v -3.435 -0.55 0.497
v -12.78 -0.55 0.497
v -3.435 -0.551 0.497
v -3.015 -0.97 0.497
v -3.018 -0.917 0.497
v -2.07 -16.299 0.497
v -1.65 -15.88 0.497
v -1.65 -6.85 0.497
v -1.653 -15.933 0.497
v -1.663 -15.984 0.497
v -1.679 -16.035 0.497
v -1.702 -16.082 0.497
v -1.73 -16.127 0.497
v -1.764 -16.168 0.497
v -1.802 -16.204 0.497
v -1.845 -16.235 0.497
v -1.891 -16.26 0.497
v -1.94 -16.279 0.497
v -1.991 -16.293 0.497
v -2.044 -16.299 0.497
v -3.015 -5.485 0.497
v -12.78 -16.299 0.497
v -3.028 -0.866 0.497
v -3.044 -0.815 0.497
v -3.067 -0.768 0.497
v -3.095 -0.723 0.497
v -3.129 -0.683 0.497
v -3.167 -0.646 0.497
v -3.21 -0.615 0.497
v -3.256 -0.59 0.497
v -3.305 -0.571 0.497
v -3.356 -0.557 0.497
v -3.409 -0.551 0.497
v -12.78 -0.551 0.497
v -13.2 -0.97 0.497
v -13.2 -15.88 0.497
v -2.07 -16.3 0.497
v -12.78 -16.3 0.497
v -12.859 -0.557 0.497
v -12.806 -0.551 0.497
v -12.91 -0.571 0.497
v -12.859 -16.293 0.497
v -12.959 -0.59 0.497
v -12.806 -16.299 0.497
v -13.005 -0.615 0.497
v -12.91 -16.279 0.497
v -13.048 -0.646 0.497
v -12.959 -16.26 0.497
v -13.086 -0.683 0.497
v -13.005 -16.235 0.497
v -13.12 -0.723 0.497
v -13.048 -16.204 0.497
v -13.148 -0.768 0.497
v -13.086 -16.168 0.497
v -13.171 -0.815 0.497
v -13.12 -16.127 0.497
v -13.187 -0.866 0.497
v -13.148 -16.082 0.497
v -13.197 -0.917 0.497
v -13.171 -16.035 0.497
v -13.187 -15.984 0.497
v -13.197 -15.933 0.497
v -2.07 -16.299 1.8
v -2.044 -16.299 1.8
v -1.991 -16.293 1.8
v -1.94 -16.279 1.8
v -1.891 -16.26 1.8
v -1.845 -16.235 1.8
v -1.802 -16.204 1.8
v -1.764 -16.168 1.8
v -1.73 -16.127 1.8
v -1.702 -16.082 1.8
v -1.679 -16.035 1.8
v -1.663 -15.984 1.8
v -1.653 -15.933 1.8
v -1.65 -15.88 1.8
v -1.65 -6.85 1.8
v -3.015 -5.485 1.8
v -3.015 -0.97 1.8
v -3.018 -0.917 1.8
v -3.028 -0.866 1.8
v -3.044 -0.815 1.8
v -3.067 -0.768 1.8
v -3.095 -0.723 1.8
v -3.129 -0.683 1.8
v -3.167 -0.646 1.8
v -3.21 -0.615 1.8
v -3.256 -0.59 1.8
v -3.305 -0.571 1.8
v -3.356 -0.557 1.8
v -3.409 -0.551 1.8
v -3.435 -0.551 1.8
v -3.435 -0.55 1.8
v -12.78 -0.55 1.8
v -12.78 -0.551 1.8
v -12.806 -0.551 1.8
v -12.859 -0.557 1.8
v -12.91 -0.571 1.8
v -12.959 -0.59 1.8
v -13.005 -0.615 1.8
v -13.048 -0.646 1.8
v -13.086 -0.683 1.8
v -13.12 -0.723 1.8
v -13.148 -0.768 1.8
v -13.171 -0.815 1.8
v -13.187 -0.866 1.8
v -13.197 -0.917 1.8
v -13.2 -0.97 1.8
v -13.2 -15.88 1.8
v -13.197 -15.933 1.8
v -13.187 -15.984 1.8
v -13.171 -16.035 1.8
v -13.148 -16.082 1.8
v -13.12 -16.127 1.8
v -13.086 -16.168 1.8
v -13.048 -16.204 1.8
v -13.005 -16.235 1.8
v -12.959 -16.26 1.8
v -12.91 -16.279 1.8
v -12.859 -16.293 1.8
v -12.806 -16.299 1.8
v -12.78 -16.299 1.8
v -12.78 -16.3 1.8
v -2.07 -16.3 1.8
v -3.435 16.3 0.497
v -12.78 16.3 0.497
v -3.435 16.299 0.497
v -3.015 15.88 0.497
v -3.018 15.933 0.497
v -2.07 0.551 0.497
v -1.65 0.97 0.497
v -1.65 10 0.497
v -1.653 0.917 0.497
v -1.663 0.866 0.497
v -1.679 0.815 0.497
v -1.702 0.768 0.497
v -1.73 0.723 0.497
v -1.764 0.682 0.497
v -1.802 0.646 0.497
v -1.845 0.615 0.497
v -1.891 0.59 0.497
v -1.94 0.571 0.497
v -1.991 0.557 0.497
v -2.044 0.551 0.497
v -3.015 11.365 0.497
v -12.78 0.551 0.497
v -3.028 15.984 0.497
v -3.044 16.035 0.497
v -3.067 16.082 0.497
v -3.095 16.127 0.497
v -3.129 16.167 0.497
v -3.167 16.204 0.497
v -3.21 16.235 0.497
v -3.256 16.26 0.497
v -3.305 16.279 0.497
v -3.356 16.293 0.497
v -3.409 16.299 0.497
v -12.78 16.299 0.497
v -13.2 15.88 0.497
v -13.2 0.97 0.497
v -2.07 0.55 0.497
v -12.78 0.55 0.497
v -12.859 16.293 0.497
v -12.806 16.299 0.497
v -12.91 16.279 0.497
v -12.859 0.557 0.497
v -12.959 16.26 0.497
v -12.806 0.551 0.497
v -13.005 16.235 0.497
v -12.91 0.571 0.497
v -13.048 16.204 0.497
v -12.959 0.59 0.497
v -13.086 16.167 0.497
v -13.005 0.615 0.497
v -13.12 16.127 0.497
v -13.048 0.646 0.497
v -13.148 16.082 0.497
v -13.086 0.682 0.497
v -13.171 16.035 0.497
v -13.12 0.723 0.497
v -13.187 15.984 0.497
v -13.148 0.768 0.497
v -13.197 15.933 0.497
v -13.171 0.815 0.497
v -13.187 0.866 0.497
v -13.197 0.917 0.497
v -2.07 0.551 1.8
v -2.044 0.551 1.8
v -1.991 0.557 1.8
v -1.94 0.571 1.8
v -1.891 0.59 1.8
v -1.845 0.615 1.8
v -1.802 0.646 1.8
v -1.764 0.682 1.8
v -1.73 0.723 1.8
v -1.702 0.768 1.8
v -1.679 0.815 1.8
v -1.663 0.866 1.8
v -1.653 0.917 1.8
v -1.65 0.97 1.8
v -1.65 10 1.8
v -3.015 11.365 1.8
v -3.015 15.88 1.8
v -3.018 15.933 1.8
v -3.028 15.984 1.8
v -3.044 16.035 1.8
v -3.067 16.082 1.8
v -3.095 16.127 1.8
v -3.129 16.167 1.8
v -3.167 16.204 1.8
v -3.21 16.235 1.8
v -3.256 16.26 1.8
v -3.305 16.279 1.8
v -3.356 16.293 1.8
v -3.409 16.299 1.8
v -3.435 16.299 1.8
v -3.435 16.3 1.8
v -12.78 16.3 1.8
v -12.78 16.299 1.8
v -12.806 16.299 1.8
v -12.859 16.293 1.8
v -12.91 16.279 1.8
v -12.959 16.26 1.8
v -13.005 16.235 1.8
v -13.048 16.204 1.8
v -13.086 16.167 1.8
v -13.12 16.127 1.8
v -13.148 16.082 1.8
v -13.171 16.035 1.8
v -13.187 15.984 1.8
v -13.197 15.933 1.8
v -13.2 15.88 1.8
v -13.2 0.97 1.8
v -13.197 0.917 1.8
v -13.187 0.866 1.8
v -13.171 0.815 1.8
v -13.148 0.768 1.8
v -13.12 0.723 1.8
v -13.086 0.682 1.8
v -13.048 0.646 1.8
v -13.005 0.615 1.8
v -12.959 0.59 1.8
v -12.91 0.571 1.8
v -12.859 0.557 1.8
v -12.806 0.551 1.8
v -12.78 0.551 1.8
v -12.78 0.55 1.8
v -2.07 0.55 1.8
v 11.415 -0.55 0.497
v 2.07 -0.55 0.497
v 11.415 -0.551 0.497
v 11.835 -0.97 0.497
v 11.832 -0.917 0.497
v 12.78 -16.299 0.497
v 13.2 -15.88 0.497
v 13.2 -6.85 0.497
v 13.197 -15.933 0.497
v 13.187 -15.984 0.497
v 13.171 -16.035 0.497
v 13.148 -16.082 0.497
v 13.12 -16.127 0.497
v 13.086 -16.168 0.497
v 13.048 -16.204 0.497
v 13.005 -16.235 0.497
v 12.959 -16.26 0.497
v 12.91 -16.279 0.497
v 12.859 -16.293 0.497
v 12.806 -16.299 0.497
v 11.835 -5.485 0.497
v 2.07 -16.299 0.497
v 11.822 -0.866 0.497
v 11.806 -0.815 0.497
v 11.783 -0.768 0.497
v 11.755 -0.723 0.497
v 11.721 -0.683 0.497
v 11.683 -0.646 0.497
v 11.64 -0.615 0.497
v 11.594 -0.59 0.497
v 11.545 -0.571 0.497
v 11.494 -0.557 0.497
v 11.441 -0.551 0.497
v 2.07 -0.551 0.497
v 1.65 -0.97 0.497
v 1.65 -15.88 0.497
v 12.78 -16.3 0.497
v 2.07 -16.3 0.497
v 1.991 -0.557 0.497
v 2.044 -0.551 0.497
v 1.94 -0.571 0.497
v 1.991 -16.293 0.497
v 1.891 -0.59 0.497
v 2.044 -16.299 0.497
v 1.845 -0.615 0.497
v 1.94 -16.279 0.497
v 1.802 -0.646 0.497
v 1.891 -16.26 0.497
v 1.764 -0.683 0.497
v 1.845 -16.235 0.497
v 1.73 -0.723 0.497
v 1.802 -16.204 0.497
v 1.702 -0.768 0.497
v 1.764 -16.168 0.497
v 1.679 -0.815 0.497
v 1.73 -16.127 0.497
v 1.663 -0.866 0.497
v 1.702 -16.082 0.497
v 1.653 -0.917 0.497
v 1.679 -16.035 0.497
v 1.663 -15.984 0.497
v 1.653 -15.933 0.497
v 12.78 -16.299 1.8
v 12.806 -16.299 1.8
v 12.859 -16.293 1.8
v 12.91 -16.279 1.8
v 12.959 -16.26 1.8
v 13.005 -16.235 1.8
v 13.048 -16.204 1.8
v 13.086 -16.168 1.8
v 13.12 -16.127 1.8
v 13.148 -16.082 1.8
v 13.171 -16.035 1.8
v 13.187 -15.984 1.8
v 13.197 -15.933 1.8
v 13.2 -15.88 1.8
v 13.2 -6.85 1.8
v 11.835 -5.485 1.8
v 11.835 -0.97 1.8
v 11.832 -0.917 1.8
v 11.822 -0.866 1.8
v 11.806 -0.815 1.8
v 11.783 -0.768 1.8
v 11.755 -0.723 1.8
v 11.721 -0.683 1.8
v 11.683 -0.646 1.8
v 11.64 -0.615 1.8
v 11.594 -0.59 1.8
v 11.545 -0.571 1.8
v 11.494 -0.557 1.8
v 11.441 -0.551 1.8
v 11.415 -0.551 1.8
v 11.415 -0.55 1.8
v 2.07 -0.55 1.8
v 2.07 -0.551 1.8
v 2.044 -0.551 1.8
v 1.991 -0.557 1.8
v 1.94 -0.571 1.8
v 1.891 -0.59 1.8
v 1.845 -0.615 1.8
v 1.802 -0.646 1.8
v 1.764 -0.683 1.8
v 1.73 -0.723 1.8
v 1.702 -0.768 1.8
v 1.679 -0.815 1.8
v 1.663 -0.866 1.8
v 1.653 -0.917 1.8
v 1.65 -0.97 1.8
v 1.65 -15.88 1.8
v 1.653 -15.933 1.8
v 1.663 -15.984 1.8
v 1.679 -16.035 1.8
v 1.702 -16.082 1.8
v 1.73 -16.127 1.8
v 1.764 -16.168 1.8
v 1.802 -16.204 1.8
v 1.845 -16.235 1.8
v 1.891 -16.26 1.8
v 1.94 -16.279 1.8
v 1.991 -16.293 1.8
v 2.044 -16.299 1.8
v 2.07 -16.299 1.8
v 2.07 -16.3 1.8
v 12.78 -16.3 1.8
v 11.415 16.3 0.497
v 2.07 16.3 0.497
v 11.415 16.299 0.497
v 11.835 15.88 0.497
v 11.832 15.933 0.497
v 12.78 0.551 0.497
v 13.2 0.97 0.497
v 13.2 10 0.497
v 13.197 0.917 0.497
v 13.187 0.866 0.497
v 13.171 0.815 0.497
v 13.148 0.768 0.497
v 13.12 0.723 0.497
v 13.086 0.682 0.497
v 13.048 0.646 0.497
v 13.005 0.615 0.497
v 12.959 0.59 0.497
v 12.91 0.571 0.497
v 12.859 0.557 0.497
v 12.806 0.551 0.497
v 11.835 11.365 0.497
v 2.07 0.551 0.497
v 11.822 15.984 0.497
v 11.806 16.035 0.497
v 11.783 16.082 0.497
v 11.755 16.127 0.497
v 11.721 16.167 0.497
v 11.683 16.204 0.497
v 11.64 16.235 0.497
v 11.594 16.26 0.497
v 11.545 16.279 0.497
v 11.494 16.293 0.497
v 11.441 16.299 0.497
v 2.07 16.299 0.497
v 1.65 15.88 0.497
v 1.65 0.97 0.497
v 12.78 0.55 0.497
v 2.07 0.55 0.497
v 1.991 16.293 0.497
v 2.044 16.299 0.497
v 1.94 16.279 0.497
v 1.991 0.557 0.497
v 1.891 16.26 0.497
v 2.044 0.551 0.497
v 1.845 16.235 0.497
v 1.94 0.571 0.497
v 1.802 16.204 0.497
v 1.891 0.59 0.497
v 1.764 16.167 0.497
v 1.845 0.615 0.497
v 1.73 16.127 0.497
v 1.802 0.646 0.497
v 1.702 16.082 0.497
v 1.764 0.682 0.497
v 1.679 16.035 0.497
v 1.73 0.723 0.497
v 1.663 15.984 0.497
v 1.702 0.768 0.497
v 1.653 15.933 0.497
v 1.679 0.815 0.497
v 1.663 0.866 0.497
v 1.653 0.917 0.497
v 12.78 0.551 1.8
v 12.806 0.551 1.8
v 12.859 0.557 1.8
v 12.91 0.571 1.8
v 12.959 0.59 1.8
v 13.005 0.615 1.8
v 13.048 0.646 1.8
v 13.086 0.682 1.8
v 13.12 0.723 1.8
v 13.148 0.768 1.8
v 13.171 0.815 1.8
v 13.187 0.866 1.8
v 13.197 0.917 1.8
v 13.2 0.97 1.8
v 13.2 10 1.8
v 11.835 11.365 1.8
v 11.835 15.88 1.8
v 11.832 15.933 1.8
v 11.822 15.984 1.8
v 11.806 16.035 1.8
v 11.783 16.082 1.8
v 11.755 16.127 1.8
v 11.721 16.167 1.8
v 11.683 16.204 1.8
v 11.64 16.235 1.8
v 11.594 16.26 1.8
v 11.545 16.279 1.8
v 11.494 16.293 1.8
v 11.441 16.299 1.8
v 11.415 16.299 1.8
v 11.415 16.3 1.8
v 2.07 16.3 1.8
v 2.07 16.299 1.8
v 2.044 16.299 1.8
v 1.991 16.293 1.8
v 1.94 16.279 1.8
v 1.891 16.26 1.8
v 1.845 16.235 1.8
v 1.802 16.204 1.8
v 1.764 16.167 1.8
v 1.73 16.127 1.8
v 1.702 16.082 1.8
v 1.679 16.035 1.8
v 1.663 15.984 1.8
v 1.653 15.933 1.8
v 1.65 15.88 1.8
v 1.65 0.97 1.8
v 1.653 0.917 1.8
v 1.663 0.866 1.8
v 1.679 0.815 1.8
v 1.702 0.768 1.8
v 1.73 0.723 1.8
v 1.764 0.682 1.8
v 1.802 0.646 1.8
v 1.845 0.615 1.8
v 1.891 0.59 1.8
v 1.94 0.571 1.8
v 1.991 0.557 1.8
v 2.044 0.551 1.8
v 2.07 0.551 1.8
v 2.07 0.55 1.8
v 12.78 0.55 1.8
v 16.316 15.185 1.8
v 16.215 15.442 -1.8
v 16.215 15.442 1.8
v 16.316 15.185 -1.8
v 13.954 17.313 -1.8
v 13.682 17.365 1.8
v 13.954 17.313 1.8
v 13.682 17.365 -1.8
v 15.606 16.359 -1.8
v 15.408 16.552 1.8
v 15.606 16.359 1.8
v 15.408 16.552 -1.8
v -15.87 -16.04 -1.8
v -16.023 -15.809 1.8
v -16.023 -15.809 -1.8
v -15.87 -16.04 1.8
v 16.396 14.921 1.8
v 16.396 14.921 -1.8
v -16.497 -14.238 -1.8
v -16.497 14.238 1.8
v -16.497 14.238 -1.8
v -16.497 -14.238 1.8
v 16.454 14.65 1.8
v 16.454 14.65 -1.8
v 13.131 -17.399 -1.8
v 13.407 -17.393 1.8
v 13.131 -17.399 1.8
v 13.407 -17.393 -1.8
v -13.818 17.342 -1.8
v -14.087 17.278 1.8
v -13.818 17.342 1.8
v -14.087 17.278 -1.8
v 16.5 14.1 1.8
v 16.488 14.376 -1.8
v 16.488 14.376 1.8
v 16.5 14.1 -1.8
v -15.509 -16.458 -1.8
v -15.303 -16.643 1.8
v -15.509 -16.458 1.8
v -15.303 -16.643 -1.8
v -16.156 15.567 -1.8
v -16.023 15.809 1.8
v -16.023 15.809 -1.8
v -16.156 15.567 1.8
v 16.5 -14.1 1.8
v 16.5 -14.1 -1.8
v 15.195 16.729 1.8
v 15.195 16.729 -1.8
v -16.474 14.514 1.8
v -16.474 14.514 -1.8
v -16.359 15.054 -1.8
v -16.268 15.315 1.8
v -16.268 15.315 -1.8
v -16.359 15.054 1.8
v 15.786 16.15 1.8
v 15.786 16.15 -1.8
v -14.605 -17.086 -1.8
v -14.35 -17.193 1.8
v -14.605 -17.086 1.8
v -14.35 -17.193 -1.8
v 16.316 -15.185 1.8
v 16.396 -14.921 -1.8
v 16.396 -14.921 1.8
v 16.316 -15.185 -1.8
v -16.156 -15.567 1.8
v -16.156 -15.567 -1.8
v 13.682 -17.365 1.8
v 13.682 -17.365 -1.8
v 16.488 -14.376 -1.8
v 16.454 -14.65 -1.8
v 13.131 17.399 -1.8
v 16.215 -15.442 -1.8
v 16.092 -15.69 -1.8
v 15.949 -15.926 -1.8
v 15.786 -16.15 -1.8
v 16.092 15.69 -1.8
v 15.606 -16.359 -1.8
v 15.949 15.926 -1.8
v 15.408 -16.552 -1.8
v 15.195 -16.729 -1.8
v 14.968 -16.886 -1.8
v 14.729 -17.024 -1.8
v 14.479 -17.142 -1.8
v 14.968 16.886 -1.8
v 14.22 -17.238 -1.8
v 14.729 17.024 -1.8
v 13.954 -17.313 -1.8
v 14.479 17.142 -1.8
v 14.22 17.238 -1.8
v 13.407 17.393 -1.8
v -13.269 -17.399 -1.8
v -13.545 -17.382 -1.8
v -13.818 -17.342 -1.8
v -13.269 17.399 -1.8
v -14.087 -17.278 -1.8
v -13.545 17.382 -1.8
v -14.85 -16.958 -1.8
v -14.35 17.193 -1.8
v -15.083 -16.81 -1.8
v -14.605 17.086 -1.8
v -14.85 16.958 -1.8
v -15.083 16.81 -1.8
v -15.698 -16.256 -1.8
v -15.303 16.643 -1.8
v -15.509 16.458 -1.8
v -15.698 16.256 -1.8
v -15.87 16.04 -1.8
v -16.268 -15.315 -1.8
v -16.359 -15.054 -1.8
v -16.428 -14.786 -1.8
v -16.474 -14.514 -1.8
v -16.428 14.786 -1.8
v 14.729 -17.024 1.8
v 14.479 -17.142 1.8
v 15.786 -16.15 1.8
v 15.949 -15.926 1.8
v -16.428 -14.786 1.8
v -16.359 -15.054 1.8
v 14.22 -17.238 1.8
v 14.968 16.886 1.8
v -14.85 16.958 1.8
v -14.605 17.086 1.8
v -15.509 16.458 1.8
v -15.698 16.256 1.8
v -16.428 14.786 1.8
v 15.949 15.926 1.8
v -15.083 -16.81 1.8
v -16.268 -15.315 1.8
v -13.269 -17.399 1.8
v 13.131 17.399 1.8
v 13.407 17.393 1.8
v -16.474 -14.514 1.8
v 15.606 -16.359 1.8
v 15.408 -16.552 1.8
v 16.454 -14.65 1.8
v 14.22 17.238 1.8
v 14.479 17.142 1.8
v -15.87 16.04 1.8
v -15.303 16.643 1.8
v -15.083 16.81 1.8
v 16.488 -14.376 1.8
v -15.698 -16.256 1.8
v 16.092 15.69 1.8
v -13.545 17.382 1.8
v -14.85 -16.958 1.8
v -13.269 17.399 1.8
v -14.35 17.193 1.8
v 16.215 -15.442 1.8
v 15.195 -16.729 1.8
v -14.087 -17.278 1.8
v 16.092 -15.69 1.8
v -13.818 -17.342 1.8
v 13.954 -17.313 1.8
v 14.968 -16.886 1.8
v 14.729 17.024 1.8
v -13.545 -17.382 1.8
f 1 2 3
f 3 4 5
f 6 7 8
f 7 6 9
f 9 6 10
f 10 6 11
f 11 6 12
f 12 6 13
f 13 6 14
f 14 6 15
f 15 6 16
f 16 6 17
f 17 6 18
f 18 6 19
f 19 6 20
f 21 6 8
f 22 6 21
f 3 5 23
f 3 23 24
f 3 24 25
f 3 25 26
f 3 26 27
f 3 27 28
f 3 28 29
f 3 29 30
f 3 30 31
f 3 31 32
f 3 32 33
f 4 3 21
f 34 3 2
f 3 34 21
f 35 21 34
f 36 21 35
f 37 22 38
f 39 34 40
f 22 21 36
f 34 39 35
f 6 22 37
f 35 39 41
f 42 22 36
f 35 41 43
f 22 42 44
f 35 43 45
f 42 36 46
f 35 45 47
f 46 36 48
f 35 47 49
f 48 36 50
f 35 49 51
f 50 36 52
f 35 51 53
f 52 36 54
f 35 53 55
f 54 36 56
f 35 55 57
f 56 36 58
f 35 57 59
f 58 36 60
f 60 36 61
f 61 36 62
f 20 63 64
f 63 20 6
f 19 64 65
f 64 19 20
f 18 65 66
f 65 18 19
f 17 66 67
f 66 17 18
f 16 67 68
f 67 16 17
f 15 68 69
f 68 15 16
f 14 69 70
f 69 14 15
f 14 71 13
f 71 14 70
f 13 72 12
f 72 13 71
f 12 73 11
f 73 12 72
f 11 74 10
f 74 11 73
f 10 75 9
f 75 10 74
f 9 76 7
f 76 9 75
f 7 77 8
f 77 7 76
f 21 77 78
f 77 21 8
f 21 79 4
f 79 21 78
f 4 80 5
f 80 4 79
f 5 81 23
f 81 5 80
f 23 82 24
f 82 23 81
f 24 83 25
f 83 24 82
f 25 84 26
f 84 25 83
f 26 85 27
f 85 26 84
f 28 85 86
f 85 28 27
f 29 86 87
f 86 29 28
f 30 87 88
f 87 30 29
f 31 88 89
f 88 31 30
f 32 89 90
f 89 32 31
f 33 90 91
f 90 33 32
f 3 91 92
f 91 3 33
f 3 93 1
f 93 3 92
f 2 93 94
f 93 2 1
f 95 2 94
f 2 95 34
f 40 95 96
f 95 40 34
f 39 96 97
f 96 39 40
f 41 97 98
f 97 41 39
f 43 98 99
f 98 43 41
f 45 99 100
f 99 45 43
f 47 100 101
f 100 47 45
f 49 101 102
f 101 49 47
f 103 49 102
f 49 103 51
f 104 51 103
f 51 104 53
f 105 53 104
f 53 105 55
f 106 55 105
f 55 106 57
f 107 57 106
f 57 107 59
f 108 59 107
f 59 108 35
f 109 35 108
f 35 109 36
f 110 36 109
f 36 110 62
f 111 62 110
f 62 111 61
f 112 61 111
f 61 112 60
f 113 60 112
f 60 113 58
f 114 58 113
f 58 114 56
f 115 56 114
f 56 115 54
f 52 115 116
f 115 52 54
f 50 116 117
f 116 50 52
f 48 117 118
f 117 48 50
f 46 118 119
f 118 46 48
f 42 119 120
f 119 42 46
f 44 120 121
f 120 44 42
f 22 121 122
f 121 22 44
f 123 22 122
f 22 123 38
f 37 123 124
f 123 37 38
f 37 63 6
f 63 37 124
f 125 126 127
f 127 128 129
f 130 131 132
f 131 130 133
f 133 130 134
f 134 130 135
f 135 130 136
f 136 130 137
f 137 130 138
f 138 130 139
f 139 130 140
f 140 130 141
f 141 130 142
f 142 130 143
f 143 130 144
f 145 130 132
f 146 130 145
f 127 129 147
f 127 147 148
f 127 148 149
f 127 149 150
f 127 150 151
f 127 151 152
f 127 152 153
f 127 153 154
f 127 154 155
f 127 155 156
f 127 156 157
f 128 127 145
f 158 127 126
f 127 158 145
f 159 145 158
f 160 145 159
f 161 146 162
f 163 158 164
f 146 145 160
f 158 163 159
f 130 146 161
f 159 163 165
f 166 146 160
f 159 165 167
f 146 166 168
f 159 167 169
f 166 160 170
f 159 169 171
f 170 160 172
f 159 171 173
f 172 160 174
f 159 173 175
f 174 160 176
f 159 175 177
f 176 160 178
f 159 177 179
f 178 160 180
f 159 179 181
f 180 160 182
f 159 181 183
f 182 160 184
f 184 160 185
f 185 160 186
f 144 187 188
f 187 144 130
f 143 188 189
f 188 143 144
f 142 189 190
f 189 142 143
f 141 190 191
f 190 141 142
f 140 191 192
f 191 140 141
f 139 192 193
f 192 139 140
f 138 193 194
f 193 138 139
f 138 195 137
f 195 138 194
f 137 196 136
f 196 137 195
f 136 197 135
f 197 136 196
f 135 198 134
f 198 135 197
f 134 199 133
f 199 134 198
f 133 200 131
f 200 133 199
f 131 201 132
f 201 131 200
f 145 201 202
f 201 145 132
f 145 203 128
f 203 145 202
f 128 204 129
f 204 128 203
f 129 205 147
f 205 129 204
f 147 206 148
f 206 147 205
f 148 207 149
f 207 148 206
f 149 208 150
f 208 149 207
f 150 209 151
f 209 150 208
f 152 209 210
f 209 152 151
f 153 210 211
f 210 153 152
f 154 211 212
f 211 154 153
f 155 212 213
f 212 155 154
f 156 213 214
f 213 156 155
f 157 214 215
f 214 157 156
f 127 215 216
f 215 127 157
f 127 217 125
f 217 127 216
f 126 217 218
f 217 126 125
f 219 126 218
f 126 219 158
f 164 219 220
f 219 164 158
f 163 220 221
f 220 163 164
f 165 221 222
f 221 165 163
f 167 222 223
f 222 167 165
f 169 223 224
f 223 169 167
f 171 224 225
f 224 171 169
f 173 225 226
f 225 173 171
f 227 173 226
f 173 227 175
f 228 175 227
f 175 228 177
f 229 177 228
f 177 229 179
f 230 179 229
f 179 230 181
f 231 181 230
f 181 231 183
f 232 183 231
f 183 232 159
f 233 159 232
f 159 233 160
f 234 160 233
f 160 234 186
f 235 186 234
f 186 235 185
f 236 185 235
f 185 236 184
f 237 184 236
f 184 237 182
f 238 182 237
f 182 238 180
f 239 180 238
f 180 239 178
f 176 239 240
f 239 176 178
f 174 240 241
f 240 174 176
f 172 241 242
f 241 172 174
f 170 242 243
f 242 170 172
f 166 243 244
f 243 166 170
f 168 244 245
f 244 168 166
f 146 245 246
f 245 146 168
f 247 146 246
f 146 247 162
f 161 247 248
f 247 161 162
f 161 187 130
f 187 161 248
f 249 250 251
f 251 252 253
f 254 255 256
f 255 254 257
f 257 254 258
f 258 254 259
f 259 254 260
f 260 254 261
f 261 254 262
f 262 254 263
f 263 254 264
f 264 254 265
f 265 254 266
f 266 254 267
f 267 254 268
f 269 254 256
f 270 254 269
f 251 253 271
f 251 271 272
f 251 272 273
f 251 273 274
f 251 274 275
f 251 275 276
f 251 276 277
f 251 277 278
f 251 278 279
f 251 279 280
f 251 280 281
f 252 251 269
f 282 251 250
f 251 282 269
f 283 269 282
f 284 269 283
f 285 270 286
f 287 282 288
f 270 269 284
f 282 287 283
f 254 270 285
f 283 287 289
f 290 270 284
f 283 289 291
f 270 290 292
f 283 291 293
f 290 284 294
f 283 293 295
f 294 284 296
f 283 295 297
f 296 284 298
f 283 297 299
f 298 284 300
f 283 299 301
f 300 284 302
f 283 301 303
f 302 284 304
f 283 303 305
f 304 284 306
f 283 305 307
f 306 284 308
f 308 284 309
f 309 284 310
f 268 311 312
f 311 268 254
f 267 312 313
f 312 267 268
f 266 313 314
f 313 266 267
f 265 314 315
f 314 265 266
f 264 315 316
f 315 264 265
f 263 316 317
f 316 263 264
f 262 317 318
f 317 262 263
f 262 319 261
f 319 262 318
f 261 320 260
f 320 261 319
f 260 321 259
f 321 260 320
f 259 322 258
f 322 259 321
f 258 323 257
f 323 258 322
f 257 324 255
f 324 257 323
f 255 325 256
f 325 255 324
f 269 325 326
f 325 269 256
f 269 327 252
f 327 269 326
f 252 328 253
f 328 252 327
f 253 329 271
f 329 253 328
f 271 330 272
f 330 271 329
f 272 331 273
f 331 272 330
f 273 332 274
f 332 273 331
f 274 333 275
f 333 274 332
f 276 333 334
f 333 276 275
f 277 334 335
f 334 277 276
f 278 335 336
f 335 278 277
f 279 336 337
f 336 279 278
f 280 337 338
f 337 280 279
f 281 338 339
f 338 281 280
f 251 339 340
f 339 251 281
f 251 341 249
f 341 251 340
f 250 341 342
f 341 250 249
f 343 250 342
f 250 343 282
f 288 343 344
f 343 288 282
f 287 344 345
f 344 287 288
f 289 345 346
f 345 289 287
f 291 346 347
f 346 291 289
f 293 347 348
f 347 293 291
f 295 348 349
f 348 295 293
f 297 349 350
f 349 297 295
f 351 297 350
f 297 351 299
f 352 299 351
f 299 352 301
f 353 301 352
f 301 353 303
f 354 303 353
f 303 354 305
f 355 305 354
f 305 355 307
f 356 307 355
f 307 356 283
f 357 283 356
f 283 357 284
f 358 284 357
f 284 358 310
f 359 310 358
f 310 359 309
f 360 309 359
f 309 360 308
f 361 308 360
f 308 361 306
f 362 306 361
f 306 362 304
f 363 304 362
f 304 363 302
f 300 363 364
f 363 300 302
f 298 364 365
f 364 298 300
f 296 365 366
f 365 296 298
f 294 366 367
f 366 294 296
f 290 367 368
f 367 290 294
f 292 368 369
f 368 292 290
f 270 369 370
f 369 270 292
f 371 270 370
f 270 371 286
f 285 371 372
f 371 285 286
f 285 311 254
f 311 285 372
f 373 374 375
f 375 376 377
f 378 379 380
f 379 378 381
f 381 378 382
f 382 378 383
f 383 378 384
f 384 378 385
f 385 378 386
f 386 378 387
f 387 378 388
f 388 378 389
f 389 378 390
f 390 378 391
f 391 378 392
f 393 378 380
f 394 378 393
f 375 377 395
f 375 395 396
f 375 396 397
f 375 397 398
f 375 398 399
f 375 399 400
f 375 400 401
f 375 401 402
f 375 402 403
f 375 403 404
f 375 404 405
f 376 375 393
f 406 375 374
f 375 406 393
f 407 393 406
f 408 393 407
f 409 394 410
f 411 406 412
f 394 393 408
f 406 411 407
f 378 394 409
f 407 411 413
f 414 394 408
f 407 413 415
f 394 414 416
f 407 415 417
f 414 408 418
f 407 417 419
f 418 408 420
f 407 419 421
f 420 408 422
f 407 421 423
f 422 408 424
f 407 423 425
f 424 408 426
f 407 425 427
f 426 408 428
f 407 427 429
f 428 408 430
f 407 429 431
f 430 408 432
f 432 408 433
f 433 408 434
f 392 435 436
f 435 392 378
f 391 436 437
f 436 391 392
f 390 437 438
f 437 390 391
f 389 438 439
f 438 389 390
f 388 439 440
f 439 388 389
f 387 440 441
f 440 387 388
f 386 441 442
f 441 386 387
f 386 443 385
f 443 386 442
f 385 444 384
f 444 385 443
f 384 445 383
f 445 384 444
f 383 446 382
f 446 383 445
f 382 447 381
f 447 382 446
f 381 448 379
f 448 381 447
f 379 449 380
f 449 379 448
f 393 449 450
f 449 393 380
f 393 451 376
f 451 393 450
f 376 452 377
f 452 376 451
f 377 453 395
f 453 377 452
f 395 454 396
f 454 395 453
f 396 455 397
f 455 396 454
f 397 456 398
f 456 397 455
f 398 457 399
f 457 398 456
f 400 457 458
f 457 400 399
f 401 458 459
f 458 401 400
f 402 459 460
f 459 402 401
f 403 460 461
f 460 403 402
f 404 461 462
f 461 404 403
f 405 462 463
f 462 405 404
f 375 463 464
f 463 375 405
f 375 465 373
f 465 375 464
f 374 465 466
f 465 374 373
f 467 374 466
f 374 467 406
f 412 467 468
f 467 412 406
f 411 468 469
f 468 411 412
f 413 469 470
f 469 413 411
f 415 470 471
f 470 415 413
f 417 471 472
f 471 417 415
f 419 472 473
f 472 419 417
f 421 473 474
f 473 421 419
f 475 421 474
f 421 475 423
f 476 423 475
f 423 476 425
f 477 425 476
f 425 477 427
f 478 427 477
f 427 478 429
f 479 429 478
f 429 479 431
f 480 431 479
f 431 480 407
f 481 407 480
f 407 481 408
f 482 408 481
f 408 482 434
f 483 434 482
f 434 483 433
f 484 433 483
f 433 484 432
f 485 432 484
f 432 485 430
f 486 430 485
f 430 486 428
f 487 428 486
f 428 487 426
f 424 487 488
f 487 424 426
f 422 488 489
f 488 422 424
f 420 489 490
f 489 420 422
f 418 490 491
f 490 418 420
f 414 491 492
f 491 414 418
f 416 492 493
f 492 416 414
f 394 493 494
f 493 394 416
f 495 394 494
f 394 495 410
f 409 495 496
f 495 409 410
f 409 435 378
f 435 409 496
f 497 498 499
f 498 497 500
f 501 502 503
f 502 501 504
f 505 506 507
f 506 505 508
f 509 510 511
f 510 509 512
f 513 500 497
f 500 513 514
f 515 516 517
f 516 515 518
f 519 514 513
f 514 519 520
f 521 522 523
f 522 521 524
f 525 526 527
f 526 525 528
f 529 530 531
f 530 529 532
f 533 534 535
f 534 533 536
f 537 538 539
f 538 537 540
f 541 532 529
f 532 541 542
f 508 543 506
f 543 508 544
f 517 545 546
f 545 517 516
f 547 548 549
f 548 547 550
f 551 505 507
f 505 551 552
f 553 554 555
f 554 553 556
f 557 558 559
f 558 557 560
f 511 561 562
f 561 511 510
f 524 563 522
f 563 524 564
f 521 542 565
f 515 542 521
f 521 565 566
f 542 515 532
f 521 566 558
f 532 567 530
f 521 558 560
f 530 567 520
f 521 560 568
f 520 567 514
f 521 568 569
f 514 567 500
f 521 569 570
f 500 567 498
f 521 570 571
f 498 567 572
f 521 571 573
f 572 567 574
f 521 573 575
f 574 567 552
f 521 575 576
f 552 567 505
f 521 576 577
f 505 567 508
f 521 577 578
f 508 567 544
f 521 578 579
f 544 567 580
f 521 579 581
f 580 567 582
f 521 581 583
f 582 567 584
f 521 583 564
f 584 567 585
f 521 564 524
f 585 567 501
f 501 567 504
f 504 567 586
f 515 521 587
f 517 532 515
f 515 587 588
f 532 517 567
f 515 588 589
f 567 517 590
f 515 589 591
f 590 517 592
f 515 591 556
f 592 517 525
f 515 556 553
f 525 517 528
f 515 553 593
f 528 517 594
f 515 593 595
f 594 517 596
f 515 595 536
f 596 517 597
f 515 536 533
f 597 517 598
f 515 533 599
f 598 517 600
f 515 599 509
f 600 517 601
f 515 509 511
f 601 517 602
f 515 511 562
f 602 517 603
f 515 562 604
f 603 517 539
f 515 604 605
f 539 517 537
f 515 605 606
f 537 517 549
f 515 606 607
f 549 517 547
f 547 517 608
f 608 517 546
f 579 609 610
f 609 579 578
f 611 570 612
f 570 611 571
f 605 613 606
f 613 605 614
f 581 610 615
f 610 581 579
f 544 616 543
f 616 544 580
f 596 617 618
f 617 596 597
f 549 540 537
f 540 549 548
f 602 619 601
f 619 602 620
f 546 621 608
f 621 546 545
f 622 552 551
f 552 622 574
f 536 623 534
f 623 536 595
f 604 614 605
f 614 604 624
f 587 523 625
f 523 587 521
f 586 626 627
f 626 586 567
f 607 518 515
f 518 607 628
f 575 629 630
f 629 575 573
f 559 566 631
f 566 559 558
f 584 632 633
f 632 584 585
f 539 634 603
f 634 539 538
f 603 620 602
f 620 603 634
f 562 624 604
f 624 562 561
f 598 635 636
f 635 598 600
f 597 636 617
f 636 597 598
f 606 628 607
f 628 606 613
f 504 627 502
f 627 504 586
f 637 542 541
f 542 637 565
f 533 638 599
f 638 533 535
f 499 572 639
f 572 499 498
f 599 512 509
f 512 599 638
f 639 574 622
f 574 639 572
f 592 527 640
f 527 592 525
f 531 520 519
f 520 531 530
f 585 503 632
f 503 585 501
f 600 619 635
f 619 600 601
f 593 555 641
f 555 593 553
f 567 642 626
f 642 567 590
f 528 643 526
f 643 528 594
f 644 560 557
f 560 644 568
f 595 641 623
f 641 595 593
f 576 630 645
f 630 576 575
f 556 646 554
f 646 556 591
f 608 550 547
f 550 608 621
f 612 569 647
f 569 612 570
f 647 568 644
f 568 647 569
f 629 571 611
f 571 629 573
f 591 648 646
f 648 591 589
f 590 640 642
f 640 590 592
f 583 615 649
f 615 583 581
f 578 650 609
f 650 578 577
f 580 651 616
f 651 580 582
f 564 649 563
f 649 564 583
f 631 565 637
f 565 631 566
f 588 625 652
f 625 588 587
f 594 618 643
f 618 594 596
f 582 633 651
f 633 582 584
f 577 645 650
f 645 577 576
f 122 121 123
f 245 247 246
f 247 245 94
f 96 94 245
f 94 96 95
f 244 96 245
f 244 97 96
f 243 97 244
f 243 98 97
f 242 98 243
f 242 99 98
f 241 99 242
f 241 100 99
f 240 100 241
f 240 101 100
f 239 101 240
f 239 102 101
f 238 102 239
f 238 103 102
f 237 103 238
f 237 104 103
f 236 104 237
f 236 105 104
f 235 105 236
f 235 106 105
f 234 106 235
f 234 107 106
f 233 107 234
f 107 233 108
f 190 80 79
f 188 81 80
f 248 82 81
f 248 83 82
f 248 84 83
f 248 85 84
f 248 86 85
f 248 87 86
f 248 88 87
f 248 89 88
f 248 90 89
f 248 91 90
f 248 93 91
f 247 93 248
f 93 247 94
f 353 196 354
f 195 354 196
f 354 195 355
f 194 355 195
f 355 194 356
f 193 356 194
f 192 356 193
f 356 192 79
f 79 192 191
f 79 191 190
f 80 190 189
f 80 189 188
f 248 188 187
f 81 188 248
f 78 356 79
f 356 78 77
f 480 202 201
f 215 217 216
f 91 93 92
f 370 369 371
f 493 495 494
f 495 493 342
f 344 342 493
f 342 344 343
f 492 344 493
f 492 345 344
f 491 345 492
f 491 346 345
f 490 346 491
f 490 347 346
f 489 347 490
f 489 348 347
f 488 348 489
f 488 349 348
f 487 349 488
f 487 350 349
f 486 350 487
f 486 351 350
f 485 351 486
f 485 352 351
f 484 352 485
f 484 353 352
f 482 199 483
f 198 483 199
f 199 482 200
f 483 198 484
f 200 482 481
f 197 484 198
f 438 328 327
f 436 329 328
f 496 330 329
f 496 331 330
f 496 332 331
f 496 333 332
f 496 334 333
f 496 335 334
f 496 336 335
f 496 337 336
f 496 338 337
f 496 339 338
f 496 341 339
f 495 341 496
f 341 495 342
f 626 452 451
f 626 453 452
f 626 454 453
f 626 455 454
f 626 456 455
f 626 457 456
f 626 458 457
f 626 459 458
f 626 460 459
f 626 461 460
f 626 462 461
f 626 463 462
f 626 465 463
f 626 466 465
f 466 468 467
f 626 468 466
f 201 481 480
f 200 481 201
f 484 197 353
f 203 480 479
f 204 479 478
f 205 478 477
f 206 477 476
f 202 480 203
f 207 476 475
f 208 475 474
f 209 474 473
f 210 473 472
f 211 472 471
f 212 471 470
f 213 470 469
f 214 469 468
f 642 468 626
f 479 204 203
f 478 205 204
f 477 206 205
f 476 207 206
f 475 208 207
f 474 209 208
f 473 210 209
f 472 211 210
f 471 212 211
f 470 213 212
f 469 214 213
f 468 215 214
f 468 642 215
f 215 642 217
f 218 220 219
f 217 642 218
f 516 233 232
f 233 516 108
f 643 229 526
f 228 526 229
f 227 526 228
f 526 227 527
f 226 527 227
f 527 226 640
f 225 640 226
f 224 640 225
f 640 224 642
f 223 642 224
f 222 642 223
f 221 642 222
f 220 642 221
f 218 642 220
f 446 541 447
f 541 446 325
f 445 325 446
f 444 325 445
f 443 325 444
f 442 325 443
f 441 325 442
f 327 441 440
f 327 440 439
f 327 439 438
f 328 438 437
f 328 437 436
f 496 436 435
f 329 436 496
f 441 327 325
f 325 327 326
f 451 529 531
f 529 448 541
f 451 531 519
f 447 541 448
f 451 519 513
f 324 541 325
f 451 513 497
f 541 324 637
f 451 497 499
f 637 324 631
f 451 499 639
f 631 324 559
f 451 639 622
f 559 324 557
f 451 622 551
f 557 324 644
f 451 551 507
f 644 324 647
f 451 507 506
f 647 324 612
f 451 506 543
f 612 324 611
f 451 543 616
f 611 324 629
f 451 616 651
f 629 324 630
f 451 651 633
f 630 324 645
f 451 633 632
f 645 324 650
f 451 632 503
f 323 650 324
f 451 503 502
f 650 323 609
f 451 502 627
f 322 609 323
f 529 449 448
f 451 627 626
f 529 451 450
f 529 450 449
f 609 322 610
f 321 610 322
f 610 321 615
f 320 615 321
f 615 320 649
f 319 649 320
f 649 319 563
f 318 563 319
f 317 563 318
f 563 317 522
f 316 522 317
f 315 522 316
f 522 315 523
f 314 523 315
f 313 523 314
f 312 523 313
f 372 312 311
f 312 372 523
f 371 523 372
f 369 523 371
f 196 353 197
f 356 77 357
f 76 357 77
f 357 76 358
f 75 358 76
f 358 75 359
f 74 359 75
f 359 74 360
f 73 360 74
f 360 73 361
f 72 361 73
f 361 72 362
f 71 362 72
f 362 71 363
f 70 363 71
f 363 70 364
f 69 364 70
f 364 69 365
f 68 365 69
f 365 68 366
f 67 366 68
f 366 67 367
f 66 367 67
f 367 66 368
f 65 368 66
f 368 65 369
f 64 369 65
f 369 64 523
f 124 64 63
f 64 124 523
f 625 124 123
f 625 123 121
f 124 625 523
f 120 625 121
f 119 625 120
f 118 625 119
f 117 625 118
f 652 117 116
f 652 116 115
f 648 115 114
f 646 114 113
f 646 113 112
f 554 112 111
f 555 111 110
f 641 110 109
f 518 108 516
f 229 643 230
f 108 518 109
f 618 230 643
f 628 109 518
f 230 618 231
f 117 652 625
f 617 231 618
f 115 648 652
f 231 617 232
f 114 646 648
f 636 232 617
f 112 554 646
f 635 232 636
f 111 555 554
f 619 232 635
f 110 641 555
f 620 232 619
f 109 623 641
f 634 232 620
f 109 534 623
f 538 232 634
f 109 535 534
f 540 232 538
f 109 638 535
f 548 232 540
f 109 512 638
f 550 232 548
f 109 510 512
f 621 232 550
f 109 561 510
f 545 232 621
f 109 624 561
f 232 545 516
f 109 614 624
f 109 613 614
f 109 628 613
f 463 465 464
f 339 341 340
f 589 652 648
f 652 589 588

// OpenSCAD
// file: ../Modules/Memory/sd.scad
/*
 * Módulos y funciones para trabajar con memorias SD.
 *
 * @author  Joaquín Fernández
 * @url     https://gitlab.com/joaquinfq/openscad/blob/master/Modules/Memory/sd.scad
 * @license CC-BY-NC-4.0
 */
/**
 * Devuelve las medidas de la memoria SD.
 *
 * @param {Number} tolerance Tolerancia a usar para las medidas.
 *
 * @return {Number[]}
 */
function getSdSize(tolerance = 0) = [
    24  + tolerance, 
    32  + tolerance, 
    2.1 + tolerance
];
/**
 * Dibuja una tarjeta SD.
 * Es útil para dejar el espacio en una figura usando la operación `difference`.
 * En este caso se recomienda:
 *
 * - Disminuir el radio para que entre mejor la memoria y usar la 
 *   transformación `scale(1.xx)` para dejar holgura.
 * - Aumentar el valor de `thickness` si se quiere dejar una profundidad mayor.
 *
 * @param radius Radio para redondear los bordes.
 */
module sd(radius = 0.5)
{
    _size = getSdSize();
    _X  = 4;
    // Grosor de la memoria
    _C  = _size[2];
    // Radio de los bordes.
    _R  =  radius;
    // Anchuras a usar
    _A  = _size[0];
    _A1 = _size[0] - _X;
    // Alturas a usar
    _B  = _size[1];
    _B1 = _size[1] - _X;
    // Construimos la ruta.
    _path      = [
        [       _R,        0 ],
        [       _R,       _R ],
        [   0     ,       _R ],
        [   0     , _B -  _R ],
        [  _R     , _B -  _R ],
        [  _R     , _B       ],
        [ _A1     , _B       ],
        [  _A     , _B1      ],
        [  _A     ,       _R ],
        [  _A - _R,       _R ],
        [  _A - _R,        0 ]
    ];
    difference()
    {
        linear_extrude(_C)
        {
            union()
            {
                polygon(_path);
                for (_i = [ 1, 4, len(_path) - 2 ])
                {
                    translate(_path[_i])
                    {
                        circle(r = _R, $fn = 50);
                    }
                }
            }
        }
    }
}
// file: ../Modules/Memory/micro-sd.scad
/*
 * Módulos y funciones para trabajar con memorias MicroSD.
 *
 * @author  Joaquín Fernández
 * @url     https://gitlab.com/joaquinfq/openscad/blob/master/Modules/Memory/micro-sd.scad
 * @license CC-BY-NC-4.0
 */
/**
 * Devuelve las medidas de la memoria MicroSD.
 *
 * @param {Number} tolerance Tolerancia a usar para las medidas.
 *
 * @return {Number[]}
 */
function getMicroSdSize(tolerance = 0) = [
    11 + tolerance, 
    15 + tolerance, 
     1 + tolerance
];
/**
 * Dibuja una tarjeta MicroSD.
 * Es útil para dejar el espacio en una figura usando la operación `difference`.
 * En este caso se recomienda:
 *
 * - Disminuir el radio para que entre mejor la memoria y usar la 
 *   transformación `scale(1.xx)` para dejar holgura.
 * - Aumentar el valor de `thickness` si se quiere dejar una profundidad mayor.
 *
 * @param radius    Radio para redondear los bordes.
 * @param showTab   Indica si se debe mostrar la pestaña superior.
 */
module microSd(radius = 0.8, showTab = 0)
{
    _size = getMicroSdSize();
    // Grosor de la memoria
    _C  = _size[2];
    _C1 = 0.7;
    // Radio de los bordes.
    _R  =  radius;
    // Anchuras a usar
    _A  = _size[0];
    _A1 =  9.7;
    // Alturas a usar
    _B  = _size[1];
    _B1 =  6.0; // 6.4
    _B2 = _B - _B1;
    // Único valor que se debe calcular.
    _X  = _B2 + (_A - _A1);
    // Construimos la ruta.
    _path      = [
        [       _R,        0 ],
        [       _R,       _R ],
        [   0     ,       _R ],
        [   0     , _B -  _R ],
        [  _R     , _B -  _R ],
        [  _R     , _B       ],
        [ _A1 - _R, _B       ],
        [ _A1 - _R, _B -  _R ],
        [ _A1     , _B -  _R ],
        [ _A1     , _X       ],
        [  _A     , _B2      ],
        [  _A     ,       _R ],
        [  _A - _R,       _R ],
        [  _A - _R,        0 ]
    ];
    difference()
    {
        linear_extrude(_C)
        {
            union()
            {
                polygon(_path);
                for (_i = [ 1, 4, 7, 12 ])
                {
                    translate(_path[_i])
                    {
                        circle(r = _R, $fn = 50);
                    }
                }
            }
        }
        if (showTab)
        {
            translate([ 0, 1.84, _C1 ])
            {
                cube([ _A, _B, _C ]);
            }
        }
    }
}
// file: ../Modules/Box/rounded.scad
/**
 * Dibuja un bloque con los bordes redondeados.
 *
 * @param width  Ancho del bloque (eje X).
 * @param height Largo del bloque (eje Y).
 * @param depth  Alto del bloque (eje Z).
 * @param radius Radio del borde.
 * @param shape  Tipo de figura a usar para redondear los bordes ('cylinder' por defecto.
 *
 * @author  Joaquín Fernández
 * @url     https://gitlab.com/joaquinfq/openscad/blob/master/Modules/Box/rounded.scad
 * @license CC-BY-NC-4.0
 */
module boxRounded(width, height, depth, radius = 1, shape = "cylinder")
{
    minkowski()
    {
        cube(
            size = [
                width  - radius * 2,
                height - radius * 2,
                depth  - radius
            ],
            center = true
        );
        if (shape == "cylinder")
        {
            cylinder(r = radius, h = radius, center = true);
        }
        else if (shape == "sphere")
        {
            sphere(r = radius, center = true);
        }
    }    
}
// file: ../Functions/floorMultiple.scad
/**
 * Aproxima el valor especificado al múltiplo inferior
 * más cercano del valor de referencia.
 * Su principal uso es aproximar por defecto un valor a 
 * un `layerHeight` inferior para dejar margen.
 *
 * @param value Valor a aproximar.
 * @param ref   Valor a usar como referencia.
 */
function floorMultiple(value, ref) = floor(value / ref) * ref;
// main file
/**
 * Dibuja un soporte para memorias SD o MicroSD que puede
 * insertarse en cajas para cartuchos Nintendo DS.
 *
 * @author  Joaquín Fernández
 * @url     https://gitlab.com/joaquinfq/openscad/blob/master/Storage/NintendoMemoryHolder.scad
 * @license CC-BY-NC-4.0
 */
use <../Functions/floorMultiple.scad>
use <../Modules/Box/rounded.scad>
use <../Modules/Memory/micro-sd.scad>
use <../Modules/Memory/sd.scad>
//-------------------------
// Valores personalizables
//-------------------------
// Tamaño usado para imprimir la pieza.
layerHeight = 0.3;
// 0: Imprime una SD, 1: Imprime 4 MicroSD.
isMicroSd   = 1;
//-------------------------
// Valores calculados
//-------------------------
scaledBy    = isMicroSd ? 1.05 : 1.02;
length      = floorMultiple(3.8, layerHeight);
height      = floorMultiple(35, layerHeight);
width       = floorMultiple(33, layerHeight);
size        = (isMicroSd ? getMicroSdSize() : getSdSize()) * scaledBy;
countX      = floor(width  / (size[0] + 1));
countY      = floor(height / (size[1] + 1));
sepX        = (width  - countX * size[0]) / (countX + 1);
sepY        = (height - countY * size[1]) / (countY + 1);
$fn         = 75;
difference()
{
    boxRounded(width, height, length, 3.3);
    translate([ - width / 2, - height / 2, length / 2 - size[2] * 1.25 ])
    {
        for (x = [ 1 : countX ])
        {
            for (y = [ 1 : countY ])
            {
                translate([
                    size[0] * (x - 1) + x * sepX,
                    size[1] * (y - 1) + y * sepY,
                    0.01
                ])
                {
                    scale([ scaledBy, scaledBy, size[2] * 1.25 ])
                    {
                        if (isMicroSd)
                        {
                           microSd(0.4);
                        }
                        else
                        {
                            sd();
                        }
                    }
                }
            }
        }
    }
}
